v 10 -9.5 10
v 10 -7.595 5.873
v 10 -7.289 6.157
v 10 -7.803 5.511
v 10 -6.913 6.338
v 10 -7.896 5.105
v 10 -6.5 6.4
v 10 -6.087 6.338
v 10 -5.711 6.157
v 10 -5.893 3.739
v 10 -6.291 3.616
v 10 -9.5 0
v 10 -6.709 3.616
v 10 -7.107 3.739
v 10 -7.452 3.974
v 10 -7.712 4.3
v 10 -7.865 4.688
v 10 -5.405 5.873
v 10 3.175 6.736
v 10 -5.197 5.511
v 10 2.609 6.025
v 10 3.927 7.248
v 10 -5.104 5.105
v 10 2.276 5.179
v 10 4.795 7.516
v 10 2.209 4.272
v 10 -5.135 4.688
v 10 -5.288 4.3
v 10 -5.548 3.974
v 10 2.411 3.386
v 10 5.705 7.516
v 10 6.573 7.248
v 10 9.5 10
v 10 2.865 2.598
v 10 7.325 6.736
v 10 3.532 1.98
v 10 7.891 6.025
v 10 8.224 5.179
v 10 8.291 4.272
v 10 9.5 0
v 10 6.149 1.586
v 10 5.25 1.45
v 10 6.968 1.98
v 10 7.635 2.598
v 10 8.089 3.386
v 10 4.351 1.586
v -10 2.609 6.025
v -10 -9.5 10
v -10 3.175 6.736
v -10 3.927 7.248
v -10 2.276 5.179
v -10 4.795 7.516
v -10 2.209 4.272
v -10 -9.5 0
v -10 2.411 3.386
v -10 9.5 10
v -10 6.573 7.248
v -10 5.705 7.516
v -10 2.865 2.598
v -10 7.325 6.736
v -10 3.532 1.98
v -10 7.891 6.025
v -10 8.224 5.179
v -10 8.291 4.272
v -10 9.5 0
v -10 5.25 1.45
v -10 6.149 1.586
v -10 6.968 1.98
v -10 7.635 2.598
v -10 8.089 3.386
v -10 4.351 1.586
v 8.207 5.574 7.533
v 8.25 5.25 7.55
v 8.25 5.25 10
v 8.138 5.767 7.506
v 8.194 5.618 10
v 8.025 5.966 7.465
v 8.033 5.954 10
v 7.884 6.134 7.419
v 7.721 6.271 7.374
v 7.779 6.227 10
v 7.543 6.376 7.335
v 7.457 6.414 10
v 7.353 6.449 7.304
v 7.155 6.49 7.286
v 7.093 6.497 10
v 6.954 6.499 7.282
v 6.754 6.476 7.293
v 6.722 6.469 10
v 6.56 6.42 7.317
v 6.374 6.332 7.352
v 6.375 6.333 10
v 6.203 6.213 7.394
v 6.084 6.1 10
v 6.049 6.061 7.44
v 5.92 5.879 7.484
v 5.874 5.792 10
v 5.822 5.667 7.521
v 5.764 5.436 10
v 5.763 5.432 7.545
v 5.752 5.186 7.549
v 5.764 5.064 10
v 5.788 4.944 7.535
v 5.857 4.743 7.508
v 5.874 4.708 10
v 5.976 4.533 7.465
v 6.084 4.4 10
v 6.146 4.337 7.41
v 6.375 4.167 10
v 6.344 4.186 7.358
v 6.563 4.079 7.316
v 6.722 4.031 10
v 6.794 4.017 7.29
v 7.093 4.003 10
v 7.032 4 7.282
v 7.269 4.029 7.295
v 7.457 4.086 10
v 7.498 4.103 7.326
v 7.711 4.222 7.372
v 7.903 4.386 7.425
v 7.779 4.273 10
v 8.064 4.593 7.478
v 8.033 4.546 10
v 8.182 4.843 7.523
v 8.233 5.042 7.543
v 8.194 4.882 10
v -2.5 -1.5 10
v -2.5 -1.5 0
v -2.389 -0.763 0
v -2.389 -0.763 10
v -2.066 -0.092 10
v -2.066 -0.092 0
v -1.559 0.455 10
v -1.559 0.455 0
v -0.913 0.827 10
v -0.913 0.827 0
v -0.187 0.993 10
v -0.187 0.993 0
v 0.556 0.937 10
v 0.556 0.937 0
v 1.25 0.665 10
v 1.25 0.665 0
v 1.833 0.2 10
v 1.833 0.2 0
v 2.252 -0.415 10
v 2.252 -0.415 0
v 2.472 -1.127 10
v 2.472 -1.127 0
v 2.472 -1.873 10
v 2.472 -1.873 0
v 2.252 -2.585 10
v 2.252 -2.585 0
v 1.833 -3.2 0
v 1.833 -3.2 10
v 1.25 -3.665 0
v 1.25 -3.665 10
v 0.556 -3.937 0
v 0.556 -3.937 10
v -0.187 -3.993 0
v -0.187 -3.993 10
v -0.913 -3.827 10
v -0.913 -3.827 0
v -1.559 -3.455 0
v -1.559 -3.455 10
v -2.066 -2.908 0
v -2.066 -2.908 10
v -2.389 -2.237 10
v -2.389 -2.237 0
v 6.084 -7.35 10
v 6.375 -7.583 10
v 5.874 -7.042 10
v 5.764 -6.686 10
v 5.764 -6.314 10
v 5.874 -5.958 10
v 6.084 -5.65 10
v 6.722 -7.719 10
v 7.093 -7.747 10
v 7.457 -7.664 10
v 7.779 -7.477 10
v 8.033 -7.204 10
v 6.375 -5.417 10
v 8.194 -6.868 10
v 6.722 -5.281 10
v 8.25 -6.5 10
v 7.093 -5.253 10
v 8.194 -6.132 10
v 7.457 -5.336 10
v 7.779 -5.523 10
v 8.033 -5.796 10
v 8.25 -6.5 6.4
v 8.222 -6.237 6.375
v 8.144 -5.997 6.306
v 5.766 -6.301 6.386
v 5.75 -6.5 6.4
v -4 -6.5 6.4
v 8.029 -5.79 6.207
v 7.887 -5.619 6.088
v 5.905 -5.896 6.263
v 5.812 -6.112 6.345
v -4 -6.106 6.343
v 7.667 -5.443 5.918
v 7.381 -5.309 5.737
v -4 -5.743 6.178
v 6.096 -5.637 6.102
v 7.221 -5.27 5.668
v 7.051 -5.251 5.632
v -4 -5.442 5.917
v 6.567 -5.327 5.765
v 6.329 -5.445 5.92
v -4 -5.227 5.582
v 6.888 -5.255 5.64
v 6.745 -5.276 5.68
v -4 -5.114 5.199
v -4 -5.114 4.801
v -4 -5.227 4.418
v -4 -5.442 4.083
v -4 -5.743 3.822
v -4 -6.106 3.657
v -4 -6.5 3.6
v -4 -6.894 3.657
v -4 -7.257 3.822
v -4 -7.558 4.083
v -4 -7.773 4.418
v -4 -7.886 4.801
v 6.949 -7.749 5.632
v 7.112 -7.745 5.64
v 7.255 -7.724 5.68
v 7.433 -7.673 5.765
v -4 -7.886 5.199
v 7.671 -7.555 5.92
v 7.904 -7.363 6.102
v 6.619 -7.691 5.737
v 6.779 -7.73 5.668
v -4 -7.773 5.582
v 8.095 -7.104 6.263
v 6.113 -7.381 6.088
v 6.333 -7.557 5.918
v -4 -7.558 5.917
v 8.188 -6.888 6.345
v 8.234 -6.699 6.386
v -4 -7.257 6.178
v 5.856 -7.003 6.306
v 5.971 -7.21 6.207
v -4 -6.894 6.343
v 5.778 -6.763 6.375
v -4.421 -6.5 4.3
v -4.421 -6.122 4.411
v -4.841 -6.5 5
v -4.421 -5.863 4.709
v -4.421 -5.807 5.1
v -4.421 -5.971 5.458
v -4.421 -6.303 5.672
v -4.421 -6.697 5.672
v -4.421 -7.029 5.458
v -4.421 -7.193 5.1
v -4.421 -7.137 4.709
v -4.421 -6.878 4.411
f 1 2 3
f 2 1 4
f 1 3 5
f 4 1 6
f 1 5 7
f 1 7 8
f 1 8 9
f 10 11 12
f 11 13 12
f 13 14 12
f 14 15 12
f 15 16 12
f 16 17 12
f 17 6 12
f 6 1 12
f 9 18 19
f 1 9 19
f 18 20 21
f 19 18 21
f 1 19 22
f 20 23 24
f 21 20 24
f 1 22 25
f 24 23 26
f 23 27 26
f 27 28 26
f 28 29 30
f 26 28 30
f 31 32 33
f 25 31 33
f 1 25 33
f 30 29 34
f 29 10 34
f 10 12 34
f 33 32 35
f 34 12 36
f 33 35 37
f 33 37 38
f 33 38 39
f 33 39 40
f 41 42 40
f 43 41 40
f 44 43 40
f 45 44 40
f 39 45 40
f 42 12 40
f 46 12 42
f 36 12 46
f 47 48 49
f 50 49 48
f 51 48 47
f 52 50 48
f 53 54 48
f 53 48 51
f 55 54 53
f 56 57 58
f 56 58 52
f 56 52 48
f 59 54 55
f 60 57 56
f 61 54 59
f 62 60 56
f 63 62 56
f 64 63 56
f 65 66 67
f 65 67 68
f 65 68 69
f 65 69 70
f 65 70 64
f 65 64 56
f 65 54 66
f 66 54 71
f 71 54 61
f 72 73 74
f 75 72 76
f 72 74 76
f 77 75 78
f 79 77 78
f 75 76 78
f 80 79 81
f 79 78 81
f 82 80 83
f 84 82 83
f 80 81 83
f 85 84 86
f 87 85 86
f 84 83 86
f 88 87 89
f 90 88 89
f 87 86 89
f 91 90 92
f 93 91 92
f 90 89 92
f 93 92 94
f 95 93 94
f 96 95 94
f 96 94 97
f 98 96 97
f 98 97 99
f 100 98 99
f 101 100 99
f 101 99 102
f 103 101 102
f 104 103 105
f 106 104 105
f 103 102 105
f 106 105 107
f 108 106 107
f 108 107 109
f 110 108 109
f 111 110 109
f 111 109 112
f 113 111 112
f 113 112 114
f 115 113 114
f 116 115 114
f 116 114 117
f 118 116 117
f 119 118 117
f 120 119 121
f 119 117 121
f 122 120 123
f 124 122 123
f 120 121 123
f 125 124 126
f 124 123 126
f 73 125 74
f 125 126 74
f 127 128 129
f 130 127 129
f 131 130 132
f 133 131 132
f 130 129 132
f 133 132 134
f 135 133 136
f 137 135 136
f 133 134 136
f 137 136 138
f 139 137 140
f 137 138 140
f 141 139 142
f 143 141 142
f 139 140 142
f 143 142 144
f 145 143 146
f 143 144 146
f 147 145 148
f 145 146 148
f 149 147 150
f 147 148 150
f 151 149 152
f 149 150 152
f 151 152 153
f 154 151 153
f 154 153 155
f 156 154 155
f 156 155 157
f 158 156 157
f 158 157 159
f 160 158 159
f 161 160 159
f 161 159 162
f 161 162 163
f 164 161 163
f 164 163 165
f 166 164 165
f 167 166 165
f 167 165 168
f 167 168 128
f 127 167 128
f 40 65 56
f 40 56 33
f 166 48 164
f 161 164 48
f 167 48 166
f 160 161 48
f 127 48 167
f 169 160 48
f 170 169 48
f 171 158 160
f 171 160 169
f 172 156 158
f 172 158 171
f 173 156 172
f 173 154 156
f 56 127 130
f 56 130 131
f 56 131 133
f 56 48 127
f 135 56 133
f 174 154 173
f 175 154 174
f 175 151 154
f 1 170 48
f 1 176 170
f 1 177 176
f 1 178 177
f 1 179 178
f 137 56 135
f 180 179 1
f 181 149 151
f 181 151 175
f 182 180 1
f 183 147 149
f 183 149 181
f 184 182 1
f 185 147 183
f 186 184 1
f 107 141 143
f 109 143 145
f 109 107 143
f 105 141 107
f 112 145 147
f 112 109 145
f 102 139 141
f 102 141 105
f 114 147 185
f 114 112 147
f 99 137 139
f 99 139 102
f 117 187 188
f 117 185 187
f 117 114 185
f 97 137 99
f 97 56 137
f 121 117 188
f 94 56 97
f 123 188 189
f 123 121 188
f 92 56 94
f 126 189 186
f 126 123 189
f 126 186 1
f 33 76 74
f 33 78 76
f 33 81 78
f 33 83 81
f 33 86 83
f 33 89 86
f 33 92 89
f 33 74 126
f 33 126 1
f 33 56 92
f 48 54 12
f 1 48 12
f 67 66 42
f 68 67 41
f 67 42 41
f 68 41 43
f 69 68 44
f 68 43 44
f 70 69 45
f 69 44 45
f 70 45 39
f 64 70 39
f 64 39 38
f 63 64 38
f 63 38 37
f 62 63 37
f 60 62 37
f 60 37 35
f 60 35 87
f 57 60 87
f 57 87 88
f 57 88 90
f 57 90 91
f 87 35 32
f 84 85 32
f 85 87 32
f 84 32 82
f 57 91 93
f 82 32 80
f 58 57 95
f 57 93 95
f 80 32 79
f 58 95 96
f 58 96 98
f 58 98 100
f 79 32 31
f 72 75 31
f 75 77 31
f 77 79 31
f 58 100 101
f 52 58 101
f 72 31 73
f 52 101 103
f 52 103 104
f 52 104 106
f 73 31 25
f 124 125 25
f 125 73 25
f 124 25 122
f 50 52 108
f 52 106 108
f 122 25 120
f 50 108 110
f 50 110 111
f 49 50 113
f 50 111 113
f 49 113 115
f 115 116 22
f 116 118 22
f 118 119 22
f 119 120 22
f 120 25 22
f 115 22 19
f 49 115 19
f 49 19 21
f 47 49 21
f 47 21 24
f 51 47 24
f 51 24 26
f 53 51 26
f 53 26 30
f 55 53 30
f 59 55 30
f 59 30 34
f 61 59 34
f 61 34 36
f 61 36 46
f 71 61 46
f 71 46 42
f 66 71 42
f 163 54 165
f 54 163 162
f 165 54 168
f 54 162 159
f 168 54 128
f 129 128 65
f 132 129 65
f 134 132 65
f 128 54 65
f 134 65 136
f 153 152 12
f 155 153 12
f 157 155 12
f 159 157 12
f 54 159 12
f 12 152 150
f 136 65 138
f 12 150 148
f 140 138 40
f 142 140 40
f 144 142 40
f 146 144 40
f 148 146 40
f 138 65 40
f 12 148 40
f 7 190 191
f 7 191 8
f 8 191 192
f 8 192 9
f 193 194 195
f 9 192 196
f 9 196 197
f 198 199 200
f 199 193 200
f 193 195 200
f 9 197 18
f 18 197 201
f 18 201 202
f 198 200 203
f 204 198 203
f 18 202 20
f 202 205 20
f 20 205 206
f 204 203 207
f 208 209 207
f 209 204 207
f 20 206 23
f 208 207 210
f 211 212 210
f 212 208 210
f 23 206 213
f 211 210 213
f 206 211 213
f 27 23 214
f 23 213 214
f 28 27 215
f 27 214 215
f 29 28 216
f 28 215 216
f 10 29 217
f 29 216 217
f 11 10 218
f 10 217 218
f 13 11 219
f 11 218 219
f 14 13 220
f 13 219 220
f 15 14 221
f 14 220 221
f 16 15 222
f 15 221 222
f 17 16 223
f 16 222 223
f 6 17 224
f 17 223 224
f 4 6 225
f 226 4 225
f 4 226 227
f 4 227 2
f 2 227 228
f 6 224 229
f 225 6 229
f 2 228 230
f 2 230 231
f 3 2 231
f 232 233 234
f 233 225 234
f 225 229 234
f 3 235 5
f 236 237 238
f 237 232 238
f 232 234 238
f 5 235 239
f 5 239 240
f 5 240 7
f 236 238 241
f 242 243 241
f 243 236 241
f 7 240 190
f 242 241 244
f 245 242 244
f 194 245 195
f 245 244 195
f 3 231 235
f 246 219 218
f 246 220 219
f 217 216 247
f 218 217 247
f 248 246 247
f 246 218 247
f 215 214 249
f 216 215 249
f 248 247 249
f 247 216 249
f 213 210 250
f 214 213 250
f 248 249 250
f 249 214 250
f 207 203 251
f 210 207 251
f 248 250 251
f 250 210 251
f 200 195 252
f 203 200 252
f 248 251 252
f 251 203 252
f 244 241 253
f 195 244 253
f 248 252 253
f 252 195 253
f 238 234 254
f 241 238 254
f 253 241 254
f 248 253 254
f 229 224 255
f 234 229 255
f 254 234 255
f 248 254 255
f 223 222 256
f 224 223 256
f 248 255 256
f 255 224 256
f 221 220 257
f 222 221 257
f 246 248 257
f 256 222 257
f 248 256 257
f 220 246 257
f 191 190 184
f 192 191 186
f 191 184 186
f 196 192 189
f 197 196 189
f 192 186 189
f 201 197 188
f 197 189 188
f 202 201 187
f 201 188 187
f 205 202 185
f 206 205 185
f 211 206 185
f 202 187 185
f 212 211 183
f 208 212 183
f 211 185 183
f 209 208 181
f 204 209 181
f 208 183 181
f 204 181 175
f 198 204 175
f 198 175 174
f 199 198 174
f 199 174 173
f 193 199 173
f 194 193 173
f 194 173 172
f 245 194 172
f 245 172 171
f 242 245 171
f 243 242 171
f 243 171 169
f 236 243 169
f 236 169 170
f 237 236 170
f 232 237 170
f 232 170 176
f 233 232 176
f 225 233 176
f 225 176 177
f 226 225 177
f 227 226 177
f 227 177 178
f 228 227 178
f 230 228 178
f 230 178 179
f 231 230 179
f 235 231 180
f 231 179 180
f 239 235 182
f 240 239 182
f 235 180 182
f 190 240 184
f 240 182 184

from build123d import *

# Parameters (mm, degrees)
SKETCH1_W                           = 20
SKETCH1_H                           = 19
BOSS_EXTRUDE1_DEPTH                 = 10
SKETCH2_R                           = 2.5
CUT_EXTRUDE1_DEPTH                  = 18.036725037
SKETCH3_R                           = 3.05
CUT_EXTRUDE2_DEPTH                  = 25.295061227
DI_METRO_DE_TALADRO_2_8_2_8_1_D     = 2.8
DI_METRO_DE_TALADRO_2_8_2_8_1_DEPTH = 14
DI_METRO_DE_TALADRO_2_8_2_8_1_TIP   = 0.841204867
TALADRO_ROSCADO_M31_REACH           = 22.387
TALADRO_ROSCADO_M31_BORE_R          = 1.25


with BuildPart() as part:
    # Sketch1 → Boss-Extrude1 (new body)
    with BuildSketch(Plane.XY):
        Rectangle(SKETCH1_W, SKETCH1_H)
    extrude(amount=BOSS_EXTRUDE1_DEPTH)

    # Sketch2 → Cut-Extrude1 (cut, through all)
    with BuildSketch(Plane(origin=(0, 0, 0), x_dir=(-1, 0, 0), z_dir=(0, 0, -1))):
        with Locations((0, -1.5)):
            Circle(SKETCH2_R)
    extrude(amount=-CUT_EXTRUDE1_DEPTH, mode=Mode.SUBTRACT)

    # Sketch3 → Cut-Extrude2 (cut, through all)
    with BuildSketch(Plane(origin=(10, 0, 0), x_dir=(0, 0, -1), z_dir=(1, 0, 0))):
        with Locations((-4.5, 5.25)):
            Circle(SKETCH3_R)
    extrude(amount=-CUT_EXTRUDE2_DEPTH, mode=Mode.SUBTRACT)

    # Diámetro de taladro Ø2.8 (2.8)1
    with Locations(Plane(origin=(10, 0, 0), x_dir=(0, 0, -1), z_dir=(1, 0, 0))):
        with Locations((-5, -6.5)):
            Hole(DI_METRO_DE_TALADRO_2_8_2_8_1_D / 2, depth=DI_METRO_DE_TALADRO_2_8_2_8_1_DEPTH)
            with Locations((0, 0, -(DI_METRO_DE_TALADRO_2_8_2_8_1_DEPTH + DI_METRO_DE_TALADRO_2_8_2_8_1_TIP / 2))):  # 118° drill point
                Cone(0, DI_METRO_DE_TALADRO_2_8_2_8_1_D / 2, DI_METRO_DE_TALADRO_2_8_2_8_1_TIP, mode=Mode.SUBTRACT)

    # Taladro roscado M31 bore → Taladro roscado M31 (cut, up to next)
    with BuildSketch(Plane(origin=(-2.648652683, -2.97524228, 10), x_dir=(1, 0, 0), z_dir=(0, 0, 1)), mode=Mode.PRIVATE) as taladro_roscado_m31_sk1:
        with Locations((9.648652683, 8.22524228)):
            Circle(TALADRO_ROSCADO_M31_BORE_R)
    taladro_roscado_m31_tool1 = extrude(taladro_roscado_m31_sk1.sketch, amount=-TALADRO_ROSCADO_M31_REACH, mode=Mode.PRIVATE) & part.part
    # Taladro roscado M31 bore → Taladro roscado M31 (cut, up to next)
    with BuildSketch(Plane(origin=(-2.648652683, -2.97524228, 10), x_dir=(1, 0, 0), z_dir=(0, 0, 1)), mode=Mode.PRIVATE) as taladro_roscado_m31_sk2:
        with Locations((9.648652683, -3.52475772)):
            Circle(TALADRO_ROSCADO_M31_BORE_R)
    taladro_roscado_m31_tool2 = extrude(taladro_roscado_m31_sk2.sketch, amount=-TALADRO_ROSCADO_M31_REACH, mode=Mode.PRIVATE) & part.part
    add(taladro_roscado_m31_tool1.solids().sort_by_distance((7, 5.25, 10))[0], mode=Mode.SUBTRACT)
    add(taladro_roscado_m31_tool2.solids().sort_by_distance((7, -6.5, 10))[0], mode=Mode.SUBTRACT)


solid = part.part
